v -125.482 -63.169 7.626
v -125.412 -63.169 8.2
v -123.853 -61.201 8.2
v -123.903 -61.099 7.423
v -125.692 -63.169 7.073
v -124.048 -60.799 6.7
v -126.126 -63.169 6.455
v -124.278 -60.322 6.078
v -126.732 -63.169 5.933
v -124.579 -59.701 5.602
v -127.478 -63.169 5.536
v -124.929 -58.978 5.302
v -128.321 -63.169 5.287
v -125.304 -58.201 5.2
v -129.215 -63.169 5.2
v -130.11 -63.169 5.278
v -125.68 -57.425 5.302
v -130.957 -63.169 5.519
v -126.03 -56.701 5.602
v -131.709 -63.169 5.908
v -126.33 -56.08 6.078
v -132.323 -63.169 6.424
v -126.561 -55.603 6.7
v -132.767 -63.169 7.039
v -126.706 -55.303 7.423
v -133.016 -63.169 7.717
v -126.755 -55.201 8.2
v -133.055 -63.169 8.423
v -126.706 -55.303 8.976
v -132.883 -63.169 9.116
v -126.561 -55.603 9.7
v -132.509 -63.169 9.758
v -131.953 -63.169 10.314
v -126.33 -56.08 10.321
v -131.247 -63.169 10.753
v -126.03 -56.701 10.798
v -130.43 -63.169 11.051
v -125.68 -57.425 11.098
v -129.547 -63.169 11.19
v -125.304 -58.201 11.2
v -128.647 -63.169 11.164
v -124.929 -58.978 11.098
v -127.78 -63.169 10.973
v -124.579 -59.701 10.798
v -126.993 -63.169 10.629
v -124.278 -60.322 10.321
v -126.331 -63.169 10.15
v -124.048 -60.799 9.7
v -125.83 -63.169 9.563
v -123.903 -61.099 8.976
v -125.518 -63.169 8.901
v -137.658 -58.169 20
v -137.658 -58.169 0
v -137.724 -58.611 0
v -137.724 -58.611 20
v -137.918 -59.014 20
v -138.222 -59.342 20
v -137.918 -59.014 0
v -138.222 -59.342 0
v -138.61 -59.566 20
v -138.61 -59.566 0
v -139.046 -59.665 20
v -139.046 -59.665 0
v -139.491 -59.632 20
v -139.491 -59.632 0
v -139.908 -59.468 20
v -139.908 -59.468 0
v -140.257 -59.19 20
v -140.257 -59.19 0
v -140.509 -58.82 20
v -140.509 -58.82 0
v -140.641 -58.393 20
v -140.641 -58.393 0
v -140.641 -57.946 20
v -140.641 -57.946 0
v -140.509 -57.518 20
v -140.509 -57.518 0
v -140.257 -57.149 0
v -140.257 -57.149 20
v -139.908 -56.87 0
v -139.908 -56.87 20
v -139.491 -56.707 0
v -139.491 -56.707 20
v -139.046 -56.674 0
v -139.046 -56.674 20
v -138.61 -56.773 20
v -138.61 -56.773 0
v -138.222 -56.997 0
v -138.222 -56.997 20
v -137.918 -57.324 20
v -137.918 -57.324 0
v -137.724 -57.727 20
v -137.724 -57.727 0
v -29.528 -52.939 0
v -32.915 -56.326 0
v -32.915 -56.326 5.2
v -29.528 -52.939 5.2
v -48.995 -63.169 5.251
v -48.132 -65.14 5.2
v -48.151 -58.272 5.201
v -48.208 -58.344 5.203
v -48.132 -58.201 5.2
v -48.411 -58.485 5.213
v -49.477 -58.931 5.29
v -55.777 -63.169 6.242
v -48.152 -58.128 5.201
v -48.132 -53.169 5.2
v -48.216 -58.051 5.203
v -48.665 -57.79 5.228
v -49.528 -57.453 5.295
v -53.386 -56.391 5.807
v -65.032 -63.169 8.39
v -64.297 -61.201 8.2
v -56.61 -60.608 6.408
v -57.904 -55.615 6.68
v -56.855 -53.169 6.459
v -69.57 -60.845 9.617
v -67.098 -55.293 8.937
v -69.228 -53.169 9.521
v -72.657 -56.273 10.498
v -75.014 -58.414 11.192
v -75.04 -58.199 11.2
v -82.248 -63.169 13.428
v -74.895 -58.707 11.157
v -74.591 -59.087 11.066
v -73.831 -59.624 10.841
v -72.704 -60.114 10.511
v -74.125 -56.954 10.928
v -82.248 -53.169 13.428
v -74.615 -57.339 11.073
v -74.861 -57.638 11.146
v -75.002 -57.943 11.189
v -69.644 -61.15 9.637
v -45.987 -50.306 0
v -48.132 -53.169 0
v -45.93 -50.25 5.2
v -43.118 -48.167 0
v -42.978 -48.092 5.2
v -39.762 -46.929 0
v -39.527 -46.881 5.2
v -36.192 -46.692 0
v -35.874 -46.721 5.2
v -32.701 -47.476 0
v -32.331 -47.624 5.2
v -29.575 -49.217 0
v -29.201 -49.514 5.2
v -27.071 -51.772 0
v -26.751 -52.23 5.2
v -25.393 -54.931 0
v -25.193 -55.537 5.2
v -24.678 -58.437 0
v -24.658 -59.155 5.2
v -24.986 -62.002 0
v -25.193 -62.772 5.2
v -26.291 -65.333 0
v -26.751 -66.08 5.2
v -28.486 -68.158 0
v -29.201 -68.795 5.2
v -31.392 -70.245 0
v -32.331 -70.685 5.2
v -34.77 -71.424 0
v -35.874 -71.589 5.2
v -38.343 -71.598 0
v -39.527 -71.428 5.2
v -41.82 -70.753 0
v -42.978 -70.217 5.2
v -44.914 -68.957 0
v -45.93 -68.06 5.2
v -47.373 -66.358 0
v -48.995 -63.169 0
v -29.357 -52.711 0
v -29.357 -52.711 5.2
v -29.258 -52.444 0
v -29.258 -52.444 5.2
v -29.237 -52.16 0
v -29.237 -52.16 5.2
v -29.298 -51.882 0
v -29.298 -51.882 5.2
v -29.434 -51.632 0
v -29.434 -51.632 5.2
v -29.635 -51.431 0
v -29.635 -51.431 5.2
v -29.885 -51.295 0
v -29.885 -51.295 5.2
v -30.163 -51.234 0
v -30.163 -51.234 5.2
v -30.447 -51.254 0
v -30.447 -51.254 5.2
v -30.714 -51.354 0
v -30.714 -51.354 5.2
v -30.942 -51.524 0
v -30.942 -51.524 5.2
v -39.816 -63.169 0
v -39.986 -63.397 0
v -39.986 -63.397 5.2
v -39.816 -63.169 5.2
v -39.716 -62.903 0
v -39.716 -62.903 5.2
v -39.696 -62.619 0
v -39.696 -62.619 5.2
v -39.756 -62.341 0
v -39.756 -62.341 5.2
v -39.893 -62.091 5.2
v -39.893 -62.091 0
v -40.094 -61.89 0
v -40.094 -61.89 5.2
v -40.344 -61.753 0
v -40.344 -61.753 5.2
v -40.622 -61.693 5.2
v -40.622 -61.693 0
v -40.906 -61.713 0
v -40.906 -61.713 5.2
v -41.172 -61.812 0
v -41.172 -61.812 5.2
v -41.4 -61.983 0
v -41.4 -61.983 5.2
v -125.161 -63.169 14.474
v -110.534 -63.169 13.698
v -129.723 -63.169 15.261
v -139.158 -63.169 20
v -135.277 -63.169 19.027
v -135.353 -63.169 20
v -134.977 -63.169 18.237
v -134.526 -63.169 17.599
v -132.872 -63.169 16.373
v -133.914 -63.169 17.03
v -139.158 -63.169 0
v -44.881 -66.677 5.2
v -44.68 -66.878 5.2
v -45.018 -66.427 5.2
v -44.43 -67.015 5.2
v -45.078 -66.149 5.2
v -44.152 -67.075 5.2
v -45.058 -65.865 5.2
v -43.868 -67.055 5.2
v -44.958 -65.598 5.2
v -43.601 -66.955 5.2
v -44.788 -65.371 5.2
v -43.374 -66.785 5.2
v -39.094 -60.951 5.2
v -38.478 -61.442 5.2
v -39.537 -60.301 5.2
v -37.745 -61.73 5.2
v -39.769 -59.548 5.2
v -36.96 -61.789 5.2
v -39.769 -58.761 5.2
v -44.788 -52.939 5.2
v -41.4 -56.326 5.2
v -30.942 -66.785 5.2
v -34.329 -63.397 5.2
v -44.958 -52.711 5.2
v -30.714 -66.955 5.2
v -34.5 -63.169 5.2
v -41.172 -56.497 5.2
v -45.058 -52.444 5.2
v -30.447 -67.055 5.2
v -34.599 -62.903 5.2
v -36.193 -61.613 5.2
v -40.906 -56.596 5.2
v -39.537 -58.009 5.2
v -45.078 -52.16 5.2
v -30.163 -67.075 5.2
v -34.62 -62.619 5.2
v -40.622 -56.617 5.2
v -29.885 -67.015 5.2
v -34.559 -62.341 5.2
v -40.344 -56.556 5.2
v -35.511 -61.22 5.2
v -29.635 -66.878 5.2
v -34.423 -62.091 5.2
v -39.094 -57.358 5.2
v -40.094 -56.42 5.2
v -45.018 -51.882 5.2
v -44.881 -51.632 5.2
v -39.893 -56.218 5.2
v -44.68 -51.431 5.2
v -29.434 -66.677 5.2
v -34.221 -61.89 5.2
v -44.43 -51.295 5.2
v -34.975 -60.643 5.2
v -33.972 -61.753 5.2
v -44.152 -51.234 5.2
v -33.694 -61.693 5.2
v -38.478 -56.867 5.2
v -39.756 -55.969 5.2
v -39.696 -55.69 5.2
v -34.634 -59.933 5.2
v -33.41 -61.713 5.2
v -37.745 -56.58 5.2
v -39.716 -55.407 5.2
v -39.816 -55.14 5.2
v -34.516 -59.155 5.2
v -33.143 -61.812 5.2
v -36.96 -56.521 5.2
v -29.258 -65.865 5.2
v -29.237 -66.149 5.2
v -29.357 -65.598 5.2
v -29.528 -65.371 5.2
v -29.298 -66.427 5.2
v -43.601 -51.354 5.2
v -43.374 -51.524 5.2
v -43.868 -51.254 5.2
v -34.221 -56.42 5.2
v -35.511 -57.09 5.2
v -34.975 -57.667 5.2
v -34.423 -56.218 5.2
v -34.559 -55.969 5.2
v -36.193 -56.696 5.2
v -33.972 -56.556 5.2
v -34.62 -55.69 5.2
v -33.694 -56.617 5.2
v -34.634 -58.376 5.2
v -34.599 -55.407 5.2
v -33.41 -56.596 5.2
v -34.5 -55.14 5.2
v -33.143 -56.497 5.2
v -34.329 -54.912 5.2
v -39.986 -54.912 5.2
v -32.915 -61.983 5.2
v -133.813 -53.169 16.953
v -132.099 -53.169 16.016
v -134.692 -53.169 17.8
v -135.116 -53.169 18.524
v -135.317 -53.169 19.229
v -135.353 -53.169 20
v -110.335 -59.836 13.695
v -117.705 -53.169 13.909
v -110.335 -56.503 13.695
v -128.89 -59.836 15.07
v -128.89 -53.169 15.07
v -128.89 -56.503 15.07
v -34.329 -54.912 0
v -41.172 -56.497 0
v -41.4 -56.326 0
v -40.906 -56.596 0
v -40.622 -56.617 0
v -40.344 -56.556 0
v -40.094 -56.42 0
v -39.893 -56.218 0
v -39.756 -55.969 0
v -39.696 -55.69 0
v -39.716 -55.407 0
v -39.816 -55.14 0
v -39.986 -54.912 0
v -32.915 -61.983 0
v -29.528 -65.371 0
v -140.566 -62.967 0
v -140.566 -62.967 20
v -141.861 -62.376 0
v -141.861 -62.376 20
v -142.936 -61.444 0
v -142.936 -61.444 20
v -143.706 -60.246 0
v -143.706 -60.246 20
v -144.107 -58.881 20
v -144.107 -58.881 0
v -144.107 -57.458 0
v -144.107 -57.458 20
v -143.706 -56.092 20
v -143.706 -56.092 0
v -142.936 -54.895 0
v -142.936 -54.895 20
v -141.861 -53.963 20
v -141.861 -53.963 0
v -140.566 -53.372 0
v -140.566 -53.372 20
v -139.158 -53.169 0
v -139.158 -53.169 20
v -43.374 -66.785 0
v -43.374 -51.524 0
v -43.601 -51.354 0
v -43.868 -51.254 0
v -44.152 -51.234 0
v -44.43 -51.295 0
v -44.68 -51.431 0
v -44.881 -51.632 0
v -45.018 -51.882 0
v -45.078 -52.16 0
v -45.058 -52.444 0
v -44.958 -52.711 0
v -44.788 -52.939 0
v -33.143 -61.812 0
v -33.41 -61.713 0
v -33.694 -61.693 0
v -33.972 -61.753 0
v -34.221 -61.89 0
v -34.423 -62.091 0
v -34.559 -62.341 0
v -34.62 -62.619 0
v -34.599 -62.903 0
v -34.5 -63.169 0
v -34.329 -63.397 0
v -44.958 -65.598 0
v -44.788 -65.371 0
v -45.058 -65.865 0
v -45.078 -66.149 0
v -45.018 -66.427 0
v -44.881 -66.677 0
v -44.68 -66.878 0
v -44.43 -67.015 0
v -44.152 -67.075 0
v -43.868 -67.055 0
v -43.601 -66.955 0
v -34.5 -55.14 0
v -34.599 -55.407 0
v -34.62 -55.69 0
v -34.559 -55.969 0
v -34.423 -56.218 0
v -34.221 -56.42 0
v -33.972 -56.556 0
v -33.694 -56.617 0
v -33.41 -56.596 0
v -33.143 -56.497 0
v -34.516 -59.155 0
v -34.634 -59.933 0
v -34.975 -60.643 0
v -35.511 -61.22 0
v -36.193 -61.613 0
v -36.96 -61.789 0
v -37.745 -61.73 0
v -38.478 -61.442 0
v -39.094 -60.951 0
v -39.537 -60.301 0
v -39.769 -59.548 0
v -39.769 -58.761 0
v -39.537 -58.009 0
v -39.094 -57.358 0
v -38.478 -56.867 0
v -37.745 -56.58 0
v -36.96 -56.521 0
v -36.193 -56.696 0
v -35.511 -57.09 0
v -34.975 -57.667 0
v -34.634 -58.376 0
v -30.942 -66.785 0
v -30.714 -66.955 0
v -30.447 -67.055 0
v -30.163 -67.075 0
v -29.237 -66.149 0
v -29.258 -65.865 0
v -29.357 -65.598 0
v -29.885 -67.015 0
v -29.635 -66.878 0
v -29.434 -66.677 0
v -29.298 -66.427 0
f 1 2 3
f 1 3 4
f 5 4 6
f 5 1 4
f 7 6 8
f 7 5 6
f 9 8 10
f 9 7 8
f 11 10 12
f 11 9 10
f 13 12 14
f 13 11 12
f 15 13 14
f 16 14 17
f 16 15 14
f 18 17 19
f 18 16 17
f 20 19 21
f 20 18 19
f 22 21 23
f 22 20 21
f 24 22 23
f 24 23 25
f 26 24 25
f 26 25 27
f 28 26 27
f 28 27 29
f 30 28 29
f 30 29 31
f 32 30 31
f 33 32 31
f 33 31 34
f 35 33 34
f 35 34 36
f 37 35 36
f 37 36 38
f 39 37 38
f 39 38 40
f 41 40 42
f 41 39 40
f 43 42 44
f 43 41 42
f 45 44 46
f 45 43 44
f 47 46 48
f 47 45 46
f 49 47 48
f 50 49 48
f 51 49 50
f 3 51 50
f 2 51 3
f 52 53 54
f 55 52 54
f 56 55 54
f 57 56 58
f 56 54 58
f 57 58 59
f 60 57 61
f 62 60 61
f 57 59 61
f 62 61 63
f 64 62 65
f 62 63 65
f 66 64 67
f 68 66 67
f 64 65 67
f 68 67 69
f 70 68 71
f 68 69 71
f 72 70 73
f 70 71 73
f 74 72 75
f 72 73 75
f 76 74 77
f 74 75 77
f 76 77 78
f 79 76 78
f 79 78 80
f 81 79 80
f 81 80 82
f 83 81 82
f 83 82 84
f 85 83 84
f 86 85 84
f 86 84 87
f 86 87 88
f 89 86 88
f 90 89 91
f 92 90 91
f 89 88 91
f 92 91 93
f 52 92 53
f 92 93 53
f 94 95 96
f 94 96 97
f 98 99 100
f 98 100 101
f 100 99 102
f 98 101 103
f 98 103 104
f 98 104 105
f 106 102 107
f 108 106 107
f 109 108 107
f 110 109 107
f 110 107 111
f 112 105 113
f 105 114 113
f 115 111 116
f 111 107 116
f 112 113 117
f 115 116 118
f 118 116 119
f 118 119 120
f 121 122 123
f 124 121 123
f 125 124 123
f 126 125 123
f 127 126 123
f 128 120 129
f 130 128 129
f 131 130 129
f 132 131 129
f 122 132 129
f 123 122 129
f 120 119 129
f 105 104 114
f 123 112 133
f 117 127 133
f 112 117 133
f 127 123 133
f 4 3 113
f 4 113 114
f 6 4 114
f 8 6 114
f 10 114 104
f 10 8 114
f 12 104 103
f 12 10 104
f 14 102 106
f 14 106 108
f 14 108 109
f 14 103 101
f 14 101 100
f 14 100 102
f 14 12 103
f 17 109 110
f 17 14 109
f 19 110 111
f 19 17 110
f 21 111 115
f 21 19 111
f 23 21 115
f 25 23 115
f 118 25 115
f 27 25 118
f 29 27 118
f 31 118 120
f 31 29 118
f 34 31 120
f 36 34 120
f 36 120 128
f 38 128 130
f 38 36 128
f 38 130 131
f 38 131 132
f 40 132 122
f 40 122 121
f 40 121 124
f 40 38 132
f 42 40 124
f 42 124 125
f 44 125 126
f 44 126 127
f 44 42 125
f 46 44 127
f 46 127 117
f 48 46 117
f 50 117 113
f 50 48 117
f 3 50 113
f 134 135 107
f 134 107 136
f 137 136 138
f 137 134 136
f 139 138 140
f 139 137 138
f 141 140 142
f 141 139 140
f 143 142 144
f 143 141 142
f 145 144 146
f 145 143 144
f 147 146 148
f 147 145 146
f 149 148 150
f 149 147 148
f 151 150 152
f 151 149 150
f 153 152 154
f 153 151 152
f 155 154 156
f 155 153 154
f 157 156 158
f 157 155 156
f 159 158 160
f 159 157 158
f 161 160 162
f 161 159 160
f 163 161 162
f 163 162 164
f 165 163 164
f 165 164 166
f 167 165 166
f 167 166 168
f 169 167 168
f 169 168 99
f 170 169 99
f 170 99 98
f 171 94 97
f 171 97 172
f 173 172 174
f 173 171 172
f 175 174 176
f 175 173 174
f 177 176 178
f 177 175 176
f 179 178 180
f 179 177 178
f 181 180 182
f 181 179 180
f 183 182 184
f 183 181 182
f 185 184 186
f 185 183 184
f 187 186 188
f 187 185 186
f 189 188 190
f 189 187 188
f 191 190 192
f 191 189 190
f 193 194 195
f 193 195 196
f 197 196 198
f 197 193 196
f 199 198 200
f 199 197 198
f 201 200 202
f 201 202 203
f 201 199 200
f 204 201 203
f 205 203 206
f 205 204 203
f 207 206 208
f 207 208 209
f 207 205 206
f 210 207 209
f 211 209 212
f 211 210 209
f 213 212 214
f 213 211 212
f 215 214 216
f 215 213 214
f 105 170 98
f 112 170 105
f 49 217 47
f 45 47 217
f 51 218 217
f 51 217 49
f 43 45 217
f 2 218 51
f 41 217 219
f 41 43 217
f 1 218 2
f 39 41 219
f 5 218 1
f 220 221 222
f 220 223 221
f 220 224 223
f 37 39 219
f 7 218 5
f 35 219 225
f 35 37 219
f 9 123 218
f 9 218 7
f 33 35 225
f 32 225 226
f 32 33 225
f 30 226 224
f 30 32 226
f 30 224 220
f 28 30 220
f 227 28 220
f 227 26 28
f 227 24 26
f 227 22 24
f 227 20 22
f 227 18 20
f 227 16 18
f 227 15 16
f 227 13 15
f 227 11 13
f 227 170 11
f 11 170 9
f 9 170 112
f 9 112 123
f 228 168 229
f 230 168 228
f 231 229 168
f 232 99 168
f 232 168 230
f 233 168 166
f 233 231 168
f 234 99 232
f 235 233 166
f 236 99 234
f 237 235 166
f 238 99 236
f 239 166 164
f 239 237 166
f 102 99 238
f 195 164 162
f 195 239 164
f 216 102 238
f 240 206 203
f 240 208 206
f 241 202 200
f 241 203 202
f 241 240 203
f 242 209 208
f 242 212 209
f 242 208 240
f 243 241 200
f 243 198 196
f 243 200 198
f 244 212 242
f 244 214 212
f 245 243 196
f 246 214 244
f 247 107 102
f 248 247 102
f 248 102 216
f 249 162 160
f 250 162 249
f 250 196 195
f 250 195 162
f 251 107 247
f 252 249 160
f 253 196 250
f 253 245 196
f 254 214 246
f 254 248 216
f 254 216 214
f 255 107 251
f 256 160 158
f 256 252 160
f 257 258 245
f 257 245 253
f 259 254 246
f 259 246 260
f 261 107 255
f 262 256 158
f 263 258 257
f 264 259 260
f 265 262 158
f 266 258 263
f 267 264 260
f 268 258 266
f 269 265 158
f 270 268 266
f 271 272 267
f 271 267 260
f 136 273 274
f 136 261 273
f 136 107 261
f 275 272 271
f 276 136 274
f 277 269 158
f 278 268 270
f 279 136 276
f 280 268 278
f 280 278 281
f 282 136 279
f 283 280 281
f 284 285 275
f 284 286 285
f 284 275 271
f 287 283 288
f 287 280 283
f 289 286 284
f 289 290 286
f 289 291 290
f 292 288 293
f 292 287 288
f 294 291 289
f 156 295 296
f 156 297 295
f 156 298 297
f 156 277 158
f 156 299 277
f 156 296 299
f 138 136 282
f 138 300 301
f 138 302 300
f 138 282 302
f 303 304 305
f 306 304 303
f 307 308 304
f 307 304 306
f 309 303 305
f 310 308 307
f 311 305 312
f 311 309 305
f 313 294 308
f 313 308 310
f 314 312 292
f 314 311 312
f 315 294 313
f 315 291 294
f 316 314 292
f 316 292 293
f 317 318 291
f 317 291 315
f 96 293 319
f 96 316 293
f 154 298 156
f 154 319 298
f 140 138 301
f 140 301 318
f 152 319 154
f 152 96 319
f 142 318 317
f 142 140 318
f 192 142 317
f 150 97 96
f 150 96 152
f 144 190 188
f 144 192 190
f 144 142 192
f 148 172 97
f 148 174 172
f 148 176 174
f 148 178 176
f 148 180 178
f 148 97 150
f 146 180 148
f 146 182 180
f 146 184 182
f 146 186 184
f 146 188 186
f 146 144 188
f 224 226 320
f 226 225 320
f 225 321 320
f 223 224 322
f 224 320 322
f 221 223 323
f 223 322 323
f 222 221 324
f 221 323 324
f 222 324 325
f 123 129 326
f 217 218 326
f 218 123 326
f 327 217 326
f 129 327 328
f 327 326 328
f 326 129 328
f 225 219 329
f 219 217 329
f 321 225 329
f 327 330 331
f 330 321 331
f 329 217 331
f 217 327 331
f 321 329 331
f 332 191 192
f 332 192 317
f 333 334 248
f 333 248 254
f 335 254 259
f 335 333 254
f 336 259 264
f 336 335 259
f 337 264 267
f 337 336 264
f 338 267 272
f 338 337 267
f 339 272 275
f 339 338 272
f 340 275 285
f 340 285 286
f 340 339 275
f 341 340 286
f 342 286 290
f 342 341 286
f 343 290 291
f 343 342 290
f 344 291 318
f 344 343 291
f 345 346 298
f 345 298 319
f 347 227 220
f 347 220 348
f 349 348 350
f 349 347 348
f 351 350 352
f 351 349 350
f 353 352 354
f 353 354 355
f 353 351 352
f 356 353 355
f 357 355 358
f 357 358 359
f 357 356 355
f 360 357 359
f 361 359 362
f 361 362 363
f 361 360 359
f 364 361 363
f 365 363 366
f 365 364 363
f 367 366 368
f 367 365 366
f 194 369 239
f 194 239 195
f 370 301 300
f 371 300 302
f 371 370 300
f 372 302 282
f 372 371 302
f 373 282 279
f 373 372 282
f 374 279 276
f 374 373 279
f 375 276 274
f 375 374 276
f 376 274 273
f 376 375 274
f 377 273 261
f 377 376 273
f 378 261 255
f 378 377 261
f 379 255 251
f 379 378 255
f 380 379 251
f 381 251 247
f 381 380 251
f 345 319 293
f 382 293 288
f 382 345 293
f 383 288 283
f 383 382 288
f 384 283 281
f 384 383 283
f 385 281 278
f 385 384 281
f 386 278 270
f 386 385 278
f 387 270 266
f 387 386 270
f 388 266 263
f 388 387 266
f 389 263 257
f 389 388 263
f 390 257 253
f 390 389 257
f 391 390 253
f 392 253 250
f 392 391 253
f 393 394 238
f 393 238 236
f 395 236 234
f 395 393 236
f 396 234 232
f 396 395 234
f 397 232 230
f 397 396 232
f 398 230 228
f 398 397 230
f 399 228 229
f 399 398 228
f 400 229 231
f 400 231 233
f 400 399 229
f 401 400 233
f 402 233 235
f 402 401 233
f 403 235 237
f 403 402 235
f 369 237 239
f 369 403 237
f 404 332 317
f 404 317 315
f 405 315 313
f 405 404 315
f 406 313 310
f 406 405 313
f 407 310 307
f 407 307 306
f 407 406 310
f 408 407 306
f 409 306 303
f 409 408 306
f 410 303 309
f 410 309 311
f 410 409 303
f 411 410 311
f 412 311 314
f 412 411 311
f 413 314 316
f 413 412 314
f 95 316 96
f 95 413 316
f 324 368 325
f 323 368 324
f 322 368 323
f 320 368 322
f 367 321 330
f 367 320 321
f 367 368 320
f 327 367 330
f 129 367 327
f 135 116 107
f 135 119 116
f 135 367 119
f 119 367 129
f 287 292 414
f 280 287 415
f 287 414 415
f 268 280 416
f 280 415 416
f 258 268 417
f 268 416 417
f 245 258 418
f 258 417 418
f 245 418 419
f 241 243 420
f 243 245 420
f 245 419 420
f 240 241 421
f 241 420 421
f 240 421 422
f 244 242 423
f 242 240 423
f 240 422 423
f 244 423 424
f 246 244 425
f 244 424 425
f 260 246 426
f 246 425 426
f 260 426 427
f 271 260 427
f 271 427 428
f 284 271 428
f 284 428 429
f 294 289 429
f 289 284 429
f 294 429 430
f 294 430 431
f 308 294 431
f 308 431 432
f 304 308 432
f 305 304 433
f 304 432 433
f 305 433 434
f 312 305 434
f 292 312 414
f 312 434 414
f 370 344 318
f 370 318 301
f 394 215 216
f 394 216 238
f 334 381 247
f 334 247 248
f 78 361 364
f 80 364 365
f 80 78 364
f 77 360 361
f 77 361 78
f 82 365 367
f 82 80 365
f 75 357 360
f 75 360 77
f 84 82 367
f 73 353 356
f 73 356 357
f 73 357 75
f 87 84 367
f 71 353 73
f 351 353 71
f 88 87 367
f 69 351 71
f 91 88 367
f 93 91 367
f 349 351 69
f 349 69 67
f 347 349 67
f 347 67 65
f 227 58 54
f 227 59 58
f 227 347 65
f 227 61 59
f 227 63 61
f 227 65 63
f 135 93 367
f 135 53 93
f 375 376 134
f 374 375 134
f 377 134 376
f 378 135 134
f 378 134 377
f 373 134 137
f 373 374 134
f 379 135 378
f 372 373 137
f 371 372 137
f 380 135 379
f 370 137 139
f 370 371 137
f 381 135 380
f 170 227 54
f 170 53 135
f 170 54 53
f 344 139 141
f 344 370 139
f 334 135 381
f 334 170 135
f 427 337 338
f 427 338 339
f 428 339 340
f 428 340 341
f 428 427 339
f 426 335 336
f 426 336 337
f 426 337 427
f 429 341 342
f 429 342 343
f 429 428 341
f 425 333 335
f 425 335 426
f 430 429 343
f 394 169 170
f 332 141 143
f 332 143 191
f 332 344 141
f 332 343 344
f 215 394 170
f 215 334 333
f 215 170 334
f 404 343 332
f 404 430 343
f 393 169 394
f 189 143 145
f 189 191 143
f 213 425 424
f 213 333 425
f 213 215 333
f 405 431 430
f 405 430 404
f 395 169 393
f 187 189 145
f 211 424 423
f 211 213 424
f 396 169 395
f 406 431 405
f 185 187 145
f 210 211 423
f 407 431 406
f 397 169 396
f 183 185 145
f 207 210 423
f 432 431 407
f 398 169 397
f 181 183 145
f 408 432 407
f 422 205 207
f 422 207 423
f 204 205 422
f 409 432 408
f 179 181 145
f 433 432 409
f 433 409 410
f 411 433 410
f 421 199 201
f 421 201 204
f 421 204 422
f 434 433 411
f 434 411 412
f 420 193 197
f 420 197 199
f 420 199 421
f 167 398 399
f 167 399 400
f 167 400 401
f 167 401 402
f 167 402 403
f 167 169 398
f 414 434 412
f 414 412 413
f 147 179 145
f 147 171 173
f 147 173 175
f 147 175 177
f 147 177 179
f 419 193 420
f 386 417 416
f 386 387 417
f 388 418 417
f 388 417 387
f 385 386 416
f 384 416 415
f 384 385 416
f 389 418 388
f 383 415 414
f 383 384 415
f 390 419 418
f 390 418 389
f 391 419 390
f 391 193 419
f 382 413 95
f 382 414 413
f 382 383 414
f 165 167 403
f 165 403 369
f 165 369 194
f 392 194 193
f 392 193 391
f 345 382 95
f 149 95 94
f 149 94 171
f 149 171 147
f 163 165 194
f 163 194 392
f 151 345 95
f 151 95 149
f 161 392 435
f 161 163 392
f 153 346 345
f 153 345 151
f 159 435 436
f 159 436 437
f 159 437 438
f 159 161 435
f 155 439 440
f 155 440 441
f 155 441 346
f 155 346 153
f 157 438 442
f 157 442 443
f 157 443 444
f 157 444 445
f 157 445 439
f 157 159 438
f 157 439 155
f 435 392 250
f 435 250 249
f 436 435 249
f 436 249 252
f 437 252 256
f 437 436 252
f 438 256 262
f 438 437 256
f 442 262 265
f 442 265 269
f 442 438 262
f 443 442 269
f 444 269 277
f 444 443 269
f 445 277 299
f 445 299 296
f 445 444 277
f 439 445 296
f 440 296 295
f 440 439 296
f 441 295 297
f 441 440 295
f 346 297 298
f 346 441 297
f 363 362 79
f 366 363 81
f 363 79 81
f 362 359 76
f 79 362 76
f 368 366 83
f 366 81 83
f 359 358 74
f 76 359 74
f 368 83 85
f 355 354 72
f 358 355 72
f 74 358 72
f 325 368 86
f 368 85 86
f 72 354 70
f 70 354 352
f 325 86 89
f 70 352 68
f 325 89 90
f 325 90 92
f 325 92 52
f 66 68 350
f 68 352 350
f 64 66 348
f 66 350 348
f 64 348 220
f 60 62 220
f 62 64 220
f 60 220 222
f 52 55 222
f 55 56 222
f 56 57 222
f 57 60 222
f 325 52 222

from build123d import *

# Parameters (mm, degrees)
F0_R          = 1.5
F0_R_2        = 2.6412895019
F1_DEPTH      = 20
F3_DEPTH      = 25
F3_DEPTH_BACK = 25
F6_R          = 3
F9_DEPTH      = 25
F11_W         = 149.615544593
F11_H         = 119.6888182312
F12_DEPTH     = 25


with BuildPart() as f1:
    # F0 (on Top) → F1 (new body)
    with BuildSketch(Plane.XY):
        with BuildLine():
            Line((-139.1577050821, 53.1693232265), (-48.1315898414, 53.1693232265))
            ThreePointArc((-48.1315898414, 53.1693232265), (-24.7040865671, 60.2304450376), (-48.9954501741, 63.1693232265))
            Line((-48.9954501741, 63.1693232265), (-139.1577050821, 63.1693232265))
            ThreePointArc((-139.1577050821, 63.1693232265), (-144.1577050821, 58.1693232265), (-139.1577050821, 53.1693232265))
        make_face()
        with Locations((-139.1577050821, 58.1693232265)):
            Circle(F0_R, mode=Mode.SUBTRACT)
        with BuildLine():
            ThreePointArc((-43.3736355328, 51.5244823211), (-44.7878490952, 51.5244823211), (-44.7878490952, 52.9386958835))
            Line((-44.7878490952, 52.9386958835), (-41.4003457692, 56.3261992095))
            ThreePointArc((-41.4003457692, 56.3261992095), (-39.9861322069, 56.3261992095), (-39.9861322069, 54.9119856471))
            Line((-39.9861322069, 54.9119856471), (-43.3736355328, 51.5244823211))
        make_face(mode=Mode.SUBTRACT)
        with BuildLine():
            ThreePointArc((-29.527561069, 52.9386958835), (-29.527561069, 51.5244823211), (-30.9417746314, 51.5244823211))
            Line((-30.9417746314, 51.5244823211), (-34.3292779574, 54.9119856471))
            ThreePointArc((-34.3292779574, 54.9119856471), (-34.3292779574, 56.3261992095), (-32.915064395, 56.3261992095))
            Line((-32.915064395, 56.3261992095), (-29.527561069, 52.9386958835))
        make_face(mode=Mode.SUBTRACT)
        with Locations((-37.1577050821, 59.1546263342)):
            Circle(F0_R_2, mode=Mode.SUBTRACT)
        with BuildLine():
            Line((-41.4003457692, 61.9830534589), (-44.7878490952, 65.3705567849))
            ThreePointArc((-44.7878490952, 65.3705567849), (-44.7878490952, 66.7847703473), (-43.3736355328, 66.7847703473))
            Line((-43.3736355328, 66.7847703473), (-39.9861322069, 63.3972670213))
            ThreePointArc((-39.9861322069, 63.3972670213), (-39.9861322069, 61.9830534589), (-41.4003457692, 61.9830534589))
        make_face(mode=Mode.SUBTRACT)
        with BuildLine():
            ThreePointArc((-30.9417746314, 66.7847703473), (-29.527561069, 66.7847703473), (-29.527561069, 65.3705567849))
            Line((-29.527561069, 65.3705567849), (-32.915064395, 61.983053459))
            ThreePointArc((-32.915064395, 61.9830534589), (-34.3292779574, 61.9830534589), (-34.3292779574, 63.3972670213))
            Line((-34.3292779574, 63.3972670213), (-30.9417746314, 66.7847703473))
        make_face(mode=Mode.SUBTRACT)
    extrude(amount=F1_DEPTH)

    # F2 (on face) → F3 (cut, two sides)
    with BuildSketch(Plane.XZ.offset(-53.1693232265)) as f3_sk:
        with BuildLine():
            add(Edge.make_bspline(
                [(-48.1315898414, 5.1997262053), (-55.5737955735, 5.517366778), (-70.0693075174, 9.5402547737), (-82.2478533544, 13.4277092293)],
                knots=[0, 0, 0, 0, 32.5655157772, 32.5655157772, 32.5655157772, 32.5655157772], degree=3))
            Line((-48.1315898414, 5.1997262053), (66.0970867342, 5.1997262053))
            Line((66.0970867342, 5.1997262053), (64.3360104363, 23.0218202323))
            Line((64.3360104363, 23.0218202323), (-14.16737711, 23.9689107984))
            Line((-14.16737711, 23.9689107984), (-21.0809869127, 20))
            Line((-21.0809869127, 20), (-48.1315898414, 24.3437178433))
            Line((-48.1315898414, 24.3437178433), (-48.1315898414, 13.4277092293))
            Line((-48.1315898414, 13.4277092293), (-82.2478533544, 13.4277092293))
        make_face()
    extrude(amount=-F3_DEPTH, mode=Mode.SUBTRACT)
    extrude(f3_sk.sketch, amount=F3_DEPTH_BACK, mode=Mode.SUBTRACT)

    # F7: sweep along a path in F4
    with BuildLine(Plane.XY.offset(5.1997262053)) as f7_path:
        Line((-61.2067505717, 58.1693232265), (-86.7135846391, 58.1693232265))
        Line((-86.7135846391, 58.1693232265), (-125.319480896, 58.1693232265))
        Line((-125.319480896, 58.1693232265), (-138.9607042074, 75.3938183188))
    # F6 (on face) → F7 (sweep, cut)
    with BuildSketch(Plane.YZ.offset(-48.1315898414)):
        with Locations((58.2011528313, 8.1997262053)):
            Circle(F6_R)
    sweep(path=f7_path.line, transition=Transition.RIGHT, mode=Mode.SUBTRACT)

    # F8 (on face) → F9 (cut)
    with BuildSketch(Plane.XZ.offset(-53.1693232265)):
        with BuildLine():
            add(Edge.make_bspline(
                [(-82.2478533544, 13.4277092293), (-114.2476946115, 13.955491595), (-135.7881426811, 12.4776158482), (-135.3534758091, 20)],
                knots=[0, 0, 0, 0, 53.5107666015, 53.5107666015, 53.5107666015, 53.5107666015], degree=3))
            Line((-82.2478533544, 13.4277092293), (-32.9686515033, 11.7128845304))
            Line((-32.9686515033, 11.7128845304), (-32.9686515033, 37.384595722))
            Line((-32.9686515033, 37.384595722), (-135.3534758091, 20))
        make_face()
    extrude(amount=-F9_DEPTH, mode=Mode.SUBTRACT)


with BuildPart() as f10_1:
    # F10: instance of F1
    add(f1.part.mirror(Plane.XZ))


with BuildPart() as f1_1:
    add(f1.part)

    # F11 (on face) → F12 (cut)
    with BuildSketch(Plane.XY.offset(20)):
        with Locations((-77.5791165652, 71.9989491627)):
            Rectangle(F11_W, F11_H)
    extrude(amount=-F12_DEPTH, mode=Mode.SUBTRACT)


solid = f10_1.part
